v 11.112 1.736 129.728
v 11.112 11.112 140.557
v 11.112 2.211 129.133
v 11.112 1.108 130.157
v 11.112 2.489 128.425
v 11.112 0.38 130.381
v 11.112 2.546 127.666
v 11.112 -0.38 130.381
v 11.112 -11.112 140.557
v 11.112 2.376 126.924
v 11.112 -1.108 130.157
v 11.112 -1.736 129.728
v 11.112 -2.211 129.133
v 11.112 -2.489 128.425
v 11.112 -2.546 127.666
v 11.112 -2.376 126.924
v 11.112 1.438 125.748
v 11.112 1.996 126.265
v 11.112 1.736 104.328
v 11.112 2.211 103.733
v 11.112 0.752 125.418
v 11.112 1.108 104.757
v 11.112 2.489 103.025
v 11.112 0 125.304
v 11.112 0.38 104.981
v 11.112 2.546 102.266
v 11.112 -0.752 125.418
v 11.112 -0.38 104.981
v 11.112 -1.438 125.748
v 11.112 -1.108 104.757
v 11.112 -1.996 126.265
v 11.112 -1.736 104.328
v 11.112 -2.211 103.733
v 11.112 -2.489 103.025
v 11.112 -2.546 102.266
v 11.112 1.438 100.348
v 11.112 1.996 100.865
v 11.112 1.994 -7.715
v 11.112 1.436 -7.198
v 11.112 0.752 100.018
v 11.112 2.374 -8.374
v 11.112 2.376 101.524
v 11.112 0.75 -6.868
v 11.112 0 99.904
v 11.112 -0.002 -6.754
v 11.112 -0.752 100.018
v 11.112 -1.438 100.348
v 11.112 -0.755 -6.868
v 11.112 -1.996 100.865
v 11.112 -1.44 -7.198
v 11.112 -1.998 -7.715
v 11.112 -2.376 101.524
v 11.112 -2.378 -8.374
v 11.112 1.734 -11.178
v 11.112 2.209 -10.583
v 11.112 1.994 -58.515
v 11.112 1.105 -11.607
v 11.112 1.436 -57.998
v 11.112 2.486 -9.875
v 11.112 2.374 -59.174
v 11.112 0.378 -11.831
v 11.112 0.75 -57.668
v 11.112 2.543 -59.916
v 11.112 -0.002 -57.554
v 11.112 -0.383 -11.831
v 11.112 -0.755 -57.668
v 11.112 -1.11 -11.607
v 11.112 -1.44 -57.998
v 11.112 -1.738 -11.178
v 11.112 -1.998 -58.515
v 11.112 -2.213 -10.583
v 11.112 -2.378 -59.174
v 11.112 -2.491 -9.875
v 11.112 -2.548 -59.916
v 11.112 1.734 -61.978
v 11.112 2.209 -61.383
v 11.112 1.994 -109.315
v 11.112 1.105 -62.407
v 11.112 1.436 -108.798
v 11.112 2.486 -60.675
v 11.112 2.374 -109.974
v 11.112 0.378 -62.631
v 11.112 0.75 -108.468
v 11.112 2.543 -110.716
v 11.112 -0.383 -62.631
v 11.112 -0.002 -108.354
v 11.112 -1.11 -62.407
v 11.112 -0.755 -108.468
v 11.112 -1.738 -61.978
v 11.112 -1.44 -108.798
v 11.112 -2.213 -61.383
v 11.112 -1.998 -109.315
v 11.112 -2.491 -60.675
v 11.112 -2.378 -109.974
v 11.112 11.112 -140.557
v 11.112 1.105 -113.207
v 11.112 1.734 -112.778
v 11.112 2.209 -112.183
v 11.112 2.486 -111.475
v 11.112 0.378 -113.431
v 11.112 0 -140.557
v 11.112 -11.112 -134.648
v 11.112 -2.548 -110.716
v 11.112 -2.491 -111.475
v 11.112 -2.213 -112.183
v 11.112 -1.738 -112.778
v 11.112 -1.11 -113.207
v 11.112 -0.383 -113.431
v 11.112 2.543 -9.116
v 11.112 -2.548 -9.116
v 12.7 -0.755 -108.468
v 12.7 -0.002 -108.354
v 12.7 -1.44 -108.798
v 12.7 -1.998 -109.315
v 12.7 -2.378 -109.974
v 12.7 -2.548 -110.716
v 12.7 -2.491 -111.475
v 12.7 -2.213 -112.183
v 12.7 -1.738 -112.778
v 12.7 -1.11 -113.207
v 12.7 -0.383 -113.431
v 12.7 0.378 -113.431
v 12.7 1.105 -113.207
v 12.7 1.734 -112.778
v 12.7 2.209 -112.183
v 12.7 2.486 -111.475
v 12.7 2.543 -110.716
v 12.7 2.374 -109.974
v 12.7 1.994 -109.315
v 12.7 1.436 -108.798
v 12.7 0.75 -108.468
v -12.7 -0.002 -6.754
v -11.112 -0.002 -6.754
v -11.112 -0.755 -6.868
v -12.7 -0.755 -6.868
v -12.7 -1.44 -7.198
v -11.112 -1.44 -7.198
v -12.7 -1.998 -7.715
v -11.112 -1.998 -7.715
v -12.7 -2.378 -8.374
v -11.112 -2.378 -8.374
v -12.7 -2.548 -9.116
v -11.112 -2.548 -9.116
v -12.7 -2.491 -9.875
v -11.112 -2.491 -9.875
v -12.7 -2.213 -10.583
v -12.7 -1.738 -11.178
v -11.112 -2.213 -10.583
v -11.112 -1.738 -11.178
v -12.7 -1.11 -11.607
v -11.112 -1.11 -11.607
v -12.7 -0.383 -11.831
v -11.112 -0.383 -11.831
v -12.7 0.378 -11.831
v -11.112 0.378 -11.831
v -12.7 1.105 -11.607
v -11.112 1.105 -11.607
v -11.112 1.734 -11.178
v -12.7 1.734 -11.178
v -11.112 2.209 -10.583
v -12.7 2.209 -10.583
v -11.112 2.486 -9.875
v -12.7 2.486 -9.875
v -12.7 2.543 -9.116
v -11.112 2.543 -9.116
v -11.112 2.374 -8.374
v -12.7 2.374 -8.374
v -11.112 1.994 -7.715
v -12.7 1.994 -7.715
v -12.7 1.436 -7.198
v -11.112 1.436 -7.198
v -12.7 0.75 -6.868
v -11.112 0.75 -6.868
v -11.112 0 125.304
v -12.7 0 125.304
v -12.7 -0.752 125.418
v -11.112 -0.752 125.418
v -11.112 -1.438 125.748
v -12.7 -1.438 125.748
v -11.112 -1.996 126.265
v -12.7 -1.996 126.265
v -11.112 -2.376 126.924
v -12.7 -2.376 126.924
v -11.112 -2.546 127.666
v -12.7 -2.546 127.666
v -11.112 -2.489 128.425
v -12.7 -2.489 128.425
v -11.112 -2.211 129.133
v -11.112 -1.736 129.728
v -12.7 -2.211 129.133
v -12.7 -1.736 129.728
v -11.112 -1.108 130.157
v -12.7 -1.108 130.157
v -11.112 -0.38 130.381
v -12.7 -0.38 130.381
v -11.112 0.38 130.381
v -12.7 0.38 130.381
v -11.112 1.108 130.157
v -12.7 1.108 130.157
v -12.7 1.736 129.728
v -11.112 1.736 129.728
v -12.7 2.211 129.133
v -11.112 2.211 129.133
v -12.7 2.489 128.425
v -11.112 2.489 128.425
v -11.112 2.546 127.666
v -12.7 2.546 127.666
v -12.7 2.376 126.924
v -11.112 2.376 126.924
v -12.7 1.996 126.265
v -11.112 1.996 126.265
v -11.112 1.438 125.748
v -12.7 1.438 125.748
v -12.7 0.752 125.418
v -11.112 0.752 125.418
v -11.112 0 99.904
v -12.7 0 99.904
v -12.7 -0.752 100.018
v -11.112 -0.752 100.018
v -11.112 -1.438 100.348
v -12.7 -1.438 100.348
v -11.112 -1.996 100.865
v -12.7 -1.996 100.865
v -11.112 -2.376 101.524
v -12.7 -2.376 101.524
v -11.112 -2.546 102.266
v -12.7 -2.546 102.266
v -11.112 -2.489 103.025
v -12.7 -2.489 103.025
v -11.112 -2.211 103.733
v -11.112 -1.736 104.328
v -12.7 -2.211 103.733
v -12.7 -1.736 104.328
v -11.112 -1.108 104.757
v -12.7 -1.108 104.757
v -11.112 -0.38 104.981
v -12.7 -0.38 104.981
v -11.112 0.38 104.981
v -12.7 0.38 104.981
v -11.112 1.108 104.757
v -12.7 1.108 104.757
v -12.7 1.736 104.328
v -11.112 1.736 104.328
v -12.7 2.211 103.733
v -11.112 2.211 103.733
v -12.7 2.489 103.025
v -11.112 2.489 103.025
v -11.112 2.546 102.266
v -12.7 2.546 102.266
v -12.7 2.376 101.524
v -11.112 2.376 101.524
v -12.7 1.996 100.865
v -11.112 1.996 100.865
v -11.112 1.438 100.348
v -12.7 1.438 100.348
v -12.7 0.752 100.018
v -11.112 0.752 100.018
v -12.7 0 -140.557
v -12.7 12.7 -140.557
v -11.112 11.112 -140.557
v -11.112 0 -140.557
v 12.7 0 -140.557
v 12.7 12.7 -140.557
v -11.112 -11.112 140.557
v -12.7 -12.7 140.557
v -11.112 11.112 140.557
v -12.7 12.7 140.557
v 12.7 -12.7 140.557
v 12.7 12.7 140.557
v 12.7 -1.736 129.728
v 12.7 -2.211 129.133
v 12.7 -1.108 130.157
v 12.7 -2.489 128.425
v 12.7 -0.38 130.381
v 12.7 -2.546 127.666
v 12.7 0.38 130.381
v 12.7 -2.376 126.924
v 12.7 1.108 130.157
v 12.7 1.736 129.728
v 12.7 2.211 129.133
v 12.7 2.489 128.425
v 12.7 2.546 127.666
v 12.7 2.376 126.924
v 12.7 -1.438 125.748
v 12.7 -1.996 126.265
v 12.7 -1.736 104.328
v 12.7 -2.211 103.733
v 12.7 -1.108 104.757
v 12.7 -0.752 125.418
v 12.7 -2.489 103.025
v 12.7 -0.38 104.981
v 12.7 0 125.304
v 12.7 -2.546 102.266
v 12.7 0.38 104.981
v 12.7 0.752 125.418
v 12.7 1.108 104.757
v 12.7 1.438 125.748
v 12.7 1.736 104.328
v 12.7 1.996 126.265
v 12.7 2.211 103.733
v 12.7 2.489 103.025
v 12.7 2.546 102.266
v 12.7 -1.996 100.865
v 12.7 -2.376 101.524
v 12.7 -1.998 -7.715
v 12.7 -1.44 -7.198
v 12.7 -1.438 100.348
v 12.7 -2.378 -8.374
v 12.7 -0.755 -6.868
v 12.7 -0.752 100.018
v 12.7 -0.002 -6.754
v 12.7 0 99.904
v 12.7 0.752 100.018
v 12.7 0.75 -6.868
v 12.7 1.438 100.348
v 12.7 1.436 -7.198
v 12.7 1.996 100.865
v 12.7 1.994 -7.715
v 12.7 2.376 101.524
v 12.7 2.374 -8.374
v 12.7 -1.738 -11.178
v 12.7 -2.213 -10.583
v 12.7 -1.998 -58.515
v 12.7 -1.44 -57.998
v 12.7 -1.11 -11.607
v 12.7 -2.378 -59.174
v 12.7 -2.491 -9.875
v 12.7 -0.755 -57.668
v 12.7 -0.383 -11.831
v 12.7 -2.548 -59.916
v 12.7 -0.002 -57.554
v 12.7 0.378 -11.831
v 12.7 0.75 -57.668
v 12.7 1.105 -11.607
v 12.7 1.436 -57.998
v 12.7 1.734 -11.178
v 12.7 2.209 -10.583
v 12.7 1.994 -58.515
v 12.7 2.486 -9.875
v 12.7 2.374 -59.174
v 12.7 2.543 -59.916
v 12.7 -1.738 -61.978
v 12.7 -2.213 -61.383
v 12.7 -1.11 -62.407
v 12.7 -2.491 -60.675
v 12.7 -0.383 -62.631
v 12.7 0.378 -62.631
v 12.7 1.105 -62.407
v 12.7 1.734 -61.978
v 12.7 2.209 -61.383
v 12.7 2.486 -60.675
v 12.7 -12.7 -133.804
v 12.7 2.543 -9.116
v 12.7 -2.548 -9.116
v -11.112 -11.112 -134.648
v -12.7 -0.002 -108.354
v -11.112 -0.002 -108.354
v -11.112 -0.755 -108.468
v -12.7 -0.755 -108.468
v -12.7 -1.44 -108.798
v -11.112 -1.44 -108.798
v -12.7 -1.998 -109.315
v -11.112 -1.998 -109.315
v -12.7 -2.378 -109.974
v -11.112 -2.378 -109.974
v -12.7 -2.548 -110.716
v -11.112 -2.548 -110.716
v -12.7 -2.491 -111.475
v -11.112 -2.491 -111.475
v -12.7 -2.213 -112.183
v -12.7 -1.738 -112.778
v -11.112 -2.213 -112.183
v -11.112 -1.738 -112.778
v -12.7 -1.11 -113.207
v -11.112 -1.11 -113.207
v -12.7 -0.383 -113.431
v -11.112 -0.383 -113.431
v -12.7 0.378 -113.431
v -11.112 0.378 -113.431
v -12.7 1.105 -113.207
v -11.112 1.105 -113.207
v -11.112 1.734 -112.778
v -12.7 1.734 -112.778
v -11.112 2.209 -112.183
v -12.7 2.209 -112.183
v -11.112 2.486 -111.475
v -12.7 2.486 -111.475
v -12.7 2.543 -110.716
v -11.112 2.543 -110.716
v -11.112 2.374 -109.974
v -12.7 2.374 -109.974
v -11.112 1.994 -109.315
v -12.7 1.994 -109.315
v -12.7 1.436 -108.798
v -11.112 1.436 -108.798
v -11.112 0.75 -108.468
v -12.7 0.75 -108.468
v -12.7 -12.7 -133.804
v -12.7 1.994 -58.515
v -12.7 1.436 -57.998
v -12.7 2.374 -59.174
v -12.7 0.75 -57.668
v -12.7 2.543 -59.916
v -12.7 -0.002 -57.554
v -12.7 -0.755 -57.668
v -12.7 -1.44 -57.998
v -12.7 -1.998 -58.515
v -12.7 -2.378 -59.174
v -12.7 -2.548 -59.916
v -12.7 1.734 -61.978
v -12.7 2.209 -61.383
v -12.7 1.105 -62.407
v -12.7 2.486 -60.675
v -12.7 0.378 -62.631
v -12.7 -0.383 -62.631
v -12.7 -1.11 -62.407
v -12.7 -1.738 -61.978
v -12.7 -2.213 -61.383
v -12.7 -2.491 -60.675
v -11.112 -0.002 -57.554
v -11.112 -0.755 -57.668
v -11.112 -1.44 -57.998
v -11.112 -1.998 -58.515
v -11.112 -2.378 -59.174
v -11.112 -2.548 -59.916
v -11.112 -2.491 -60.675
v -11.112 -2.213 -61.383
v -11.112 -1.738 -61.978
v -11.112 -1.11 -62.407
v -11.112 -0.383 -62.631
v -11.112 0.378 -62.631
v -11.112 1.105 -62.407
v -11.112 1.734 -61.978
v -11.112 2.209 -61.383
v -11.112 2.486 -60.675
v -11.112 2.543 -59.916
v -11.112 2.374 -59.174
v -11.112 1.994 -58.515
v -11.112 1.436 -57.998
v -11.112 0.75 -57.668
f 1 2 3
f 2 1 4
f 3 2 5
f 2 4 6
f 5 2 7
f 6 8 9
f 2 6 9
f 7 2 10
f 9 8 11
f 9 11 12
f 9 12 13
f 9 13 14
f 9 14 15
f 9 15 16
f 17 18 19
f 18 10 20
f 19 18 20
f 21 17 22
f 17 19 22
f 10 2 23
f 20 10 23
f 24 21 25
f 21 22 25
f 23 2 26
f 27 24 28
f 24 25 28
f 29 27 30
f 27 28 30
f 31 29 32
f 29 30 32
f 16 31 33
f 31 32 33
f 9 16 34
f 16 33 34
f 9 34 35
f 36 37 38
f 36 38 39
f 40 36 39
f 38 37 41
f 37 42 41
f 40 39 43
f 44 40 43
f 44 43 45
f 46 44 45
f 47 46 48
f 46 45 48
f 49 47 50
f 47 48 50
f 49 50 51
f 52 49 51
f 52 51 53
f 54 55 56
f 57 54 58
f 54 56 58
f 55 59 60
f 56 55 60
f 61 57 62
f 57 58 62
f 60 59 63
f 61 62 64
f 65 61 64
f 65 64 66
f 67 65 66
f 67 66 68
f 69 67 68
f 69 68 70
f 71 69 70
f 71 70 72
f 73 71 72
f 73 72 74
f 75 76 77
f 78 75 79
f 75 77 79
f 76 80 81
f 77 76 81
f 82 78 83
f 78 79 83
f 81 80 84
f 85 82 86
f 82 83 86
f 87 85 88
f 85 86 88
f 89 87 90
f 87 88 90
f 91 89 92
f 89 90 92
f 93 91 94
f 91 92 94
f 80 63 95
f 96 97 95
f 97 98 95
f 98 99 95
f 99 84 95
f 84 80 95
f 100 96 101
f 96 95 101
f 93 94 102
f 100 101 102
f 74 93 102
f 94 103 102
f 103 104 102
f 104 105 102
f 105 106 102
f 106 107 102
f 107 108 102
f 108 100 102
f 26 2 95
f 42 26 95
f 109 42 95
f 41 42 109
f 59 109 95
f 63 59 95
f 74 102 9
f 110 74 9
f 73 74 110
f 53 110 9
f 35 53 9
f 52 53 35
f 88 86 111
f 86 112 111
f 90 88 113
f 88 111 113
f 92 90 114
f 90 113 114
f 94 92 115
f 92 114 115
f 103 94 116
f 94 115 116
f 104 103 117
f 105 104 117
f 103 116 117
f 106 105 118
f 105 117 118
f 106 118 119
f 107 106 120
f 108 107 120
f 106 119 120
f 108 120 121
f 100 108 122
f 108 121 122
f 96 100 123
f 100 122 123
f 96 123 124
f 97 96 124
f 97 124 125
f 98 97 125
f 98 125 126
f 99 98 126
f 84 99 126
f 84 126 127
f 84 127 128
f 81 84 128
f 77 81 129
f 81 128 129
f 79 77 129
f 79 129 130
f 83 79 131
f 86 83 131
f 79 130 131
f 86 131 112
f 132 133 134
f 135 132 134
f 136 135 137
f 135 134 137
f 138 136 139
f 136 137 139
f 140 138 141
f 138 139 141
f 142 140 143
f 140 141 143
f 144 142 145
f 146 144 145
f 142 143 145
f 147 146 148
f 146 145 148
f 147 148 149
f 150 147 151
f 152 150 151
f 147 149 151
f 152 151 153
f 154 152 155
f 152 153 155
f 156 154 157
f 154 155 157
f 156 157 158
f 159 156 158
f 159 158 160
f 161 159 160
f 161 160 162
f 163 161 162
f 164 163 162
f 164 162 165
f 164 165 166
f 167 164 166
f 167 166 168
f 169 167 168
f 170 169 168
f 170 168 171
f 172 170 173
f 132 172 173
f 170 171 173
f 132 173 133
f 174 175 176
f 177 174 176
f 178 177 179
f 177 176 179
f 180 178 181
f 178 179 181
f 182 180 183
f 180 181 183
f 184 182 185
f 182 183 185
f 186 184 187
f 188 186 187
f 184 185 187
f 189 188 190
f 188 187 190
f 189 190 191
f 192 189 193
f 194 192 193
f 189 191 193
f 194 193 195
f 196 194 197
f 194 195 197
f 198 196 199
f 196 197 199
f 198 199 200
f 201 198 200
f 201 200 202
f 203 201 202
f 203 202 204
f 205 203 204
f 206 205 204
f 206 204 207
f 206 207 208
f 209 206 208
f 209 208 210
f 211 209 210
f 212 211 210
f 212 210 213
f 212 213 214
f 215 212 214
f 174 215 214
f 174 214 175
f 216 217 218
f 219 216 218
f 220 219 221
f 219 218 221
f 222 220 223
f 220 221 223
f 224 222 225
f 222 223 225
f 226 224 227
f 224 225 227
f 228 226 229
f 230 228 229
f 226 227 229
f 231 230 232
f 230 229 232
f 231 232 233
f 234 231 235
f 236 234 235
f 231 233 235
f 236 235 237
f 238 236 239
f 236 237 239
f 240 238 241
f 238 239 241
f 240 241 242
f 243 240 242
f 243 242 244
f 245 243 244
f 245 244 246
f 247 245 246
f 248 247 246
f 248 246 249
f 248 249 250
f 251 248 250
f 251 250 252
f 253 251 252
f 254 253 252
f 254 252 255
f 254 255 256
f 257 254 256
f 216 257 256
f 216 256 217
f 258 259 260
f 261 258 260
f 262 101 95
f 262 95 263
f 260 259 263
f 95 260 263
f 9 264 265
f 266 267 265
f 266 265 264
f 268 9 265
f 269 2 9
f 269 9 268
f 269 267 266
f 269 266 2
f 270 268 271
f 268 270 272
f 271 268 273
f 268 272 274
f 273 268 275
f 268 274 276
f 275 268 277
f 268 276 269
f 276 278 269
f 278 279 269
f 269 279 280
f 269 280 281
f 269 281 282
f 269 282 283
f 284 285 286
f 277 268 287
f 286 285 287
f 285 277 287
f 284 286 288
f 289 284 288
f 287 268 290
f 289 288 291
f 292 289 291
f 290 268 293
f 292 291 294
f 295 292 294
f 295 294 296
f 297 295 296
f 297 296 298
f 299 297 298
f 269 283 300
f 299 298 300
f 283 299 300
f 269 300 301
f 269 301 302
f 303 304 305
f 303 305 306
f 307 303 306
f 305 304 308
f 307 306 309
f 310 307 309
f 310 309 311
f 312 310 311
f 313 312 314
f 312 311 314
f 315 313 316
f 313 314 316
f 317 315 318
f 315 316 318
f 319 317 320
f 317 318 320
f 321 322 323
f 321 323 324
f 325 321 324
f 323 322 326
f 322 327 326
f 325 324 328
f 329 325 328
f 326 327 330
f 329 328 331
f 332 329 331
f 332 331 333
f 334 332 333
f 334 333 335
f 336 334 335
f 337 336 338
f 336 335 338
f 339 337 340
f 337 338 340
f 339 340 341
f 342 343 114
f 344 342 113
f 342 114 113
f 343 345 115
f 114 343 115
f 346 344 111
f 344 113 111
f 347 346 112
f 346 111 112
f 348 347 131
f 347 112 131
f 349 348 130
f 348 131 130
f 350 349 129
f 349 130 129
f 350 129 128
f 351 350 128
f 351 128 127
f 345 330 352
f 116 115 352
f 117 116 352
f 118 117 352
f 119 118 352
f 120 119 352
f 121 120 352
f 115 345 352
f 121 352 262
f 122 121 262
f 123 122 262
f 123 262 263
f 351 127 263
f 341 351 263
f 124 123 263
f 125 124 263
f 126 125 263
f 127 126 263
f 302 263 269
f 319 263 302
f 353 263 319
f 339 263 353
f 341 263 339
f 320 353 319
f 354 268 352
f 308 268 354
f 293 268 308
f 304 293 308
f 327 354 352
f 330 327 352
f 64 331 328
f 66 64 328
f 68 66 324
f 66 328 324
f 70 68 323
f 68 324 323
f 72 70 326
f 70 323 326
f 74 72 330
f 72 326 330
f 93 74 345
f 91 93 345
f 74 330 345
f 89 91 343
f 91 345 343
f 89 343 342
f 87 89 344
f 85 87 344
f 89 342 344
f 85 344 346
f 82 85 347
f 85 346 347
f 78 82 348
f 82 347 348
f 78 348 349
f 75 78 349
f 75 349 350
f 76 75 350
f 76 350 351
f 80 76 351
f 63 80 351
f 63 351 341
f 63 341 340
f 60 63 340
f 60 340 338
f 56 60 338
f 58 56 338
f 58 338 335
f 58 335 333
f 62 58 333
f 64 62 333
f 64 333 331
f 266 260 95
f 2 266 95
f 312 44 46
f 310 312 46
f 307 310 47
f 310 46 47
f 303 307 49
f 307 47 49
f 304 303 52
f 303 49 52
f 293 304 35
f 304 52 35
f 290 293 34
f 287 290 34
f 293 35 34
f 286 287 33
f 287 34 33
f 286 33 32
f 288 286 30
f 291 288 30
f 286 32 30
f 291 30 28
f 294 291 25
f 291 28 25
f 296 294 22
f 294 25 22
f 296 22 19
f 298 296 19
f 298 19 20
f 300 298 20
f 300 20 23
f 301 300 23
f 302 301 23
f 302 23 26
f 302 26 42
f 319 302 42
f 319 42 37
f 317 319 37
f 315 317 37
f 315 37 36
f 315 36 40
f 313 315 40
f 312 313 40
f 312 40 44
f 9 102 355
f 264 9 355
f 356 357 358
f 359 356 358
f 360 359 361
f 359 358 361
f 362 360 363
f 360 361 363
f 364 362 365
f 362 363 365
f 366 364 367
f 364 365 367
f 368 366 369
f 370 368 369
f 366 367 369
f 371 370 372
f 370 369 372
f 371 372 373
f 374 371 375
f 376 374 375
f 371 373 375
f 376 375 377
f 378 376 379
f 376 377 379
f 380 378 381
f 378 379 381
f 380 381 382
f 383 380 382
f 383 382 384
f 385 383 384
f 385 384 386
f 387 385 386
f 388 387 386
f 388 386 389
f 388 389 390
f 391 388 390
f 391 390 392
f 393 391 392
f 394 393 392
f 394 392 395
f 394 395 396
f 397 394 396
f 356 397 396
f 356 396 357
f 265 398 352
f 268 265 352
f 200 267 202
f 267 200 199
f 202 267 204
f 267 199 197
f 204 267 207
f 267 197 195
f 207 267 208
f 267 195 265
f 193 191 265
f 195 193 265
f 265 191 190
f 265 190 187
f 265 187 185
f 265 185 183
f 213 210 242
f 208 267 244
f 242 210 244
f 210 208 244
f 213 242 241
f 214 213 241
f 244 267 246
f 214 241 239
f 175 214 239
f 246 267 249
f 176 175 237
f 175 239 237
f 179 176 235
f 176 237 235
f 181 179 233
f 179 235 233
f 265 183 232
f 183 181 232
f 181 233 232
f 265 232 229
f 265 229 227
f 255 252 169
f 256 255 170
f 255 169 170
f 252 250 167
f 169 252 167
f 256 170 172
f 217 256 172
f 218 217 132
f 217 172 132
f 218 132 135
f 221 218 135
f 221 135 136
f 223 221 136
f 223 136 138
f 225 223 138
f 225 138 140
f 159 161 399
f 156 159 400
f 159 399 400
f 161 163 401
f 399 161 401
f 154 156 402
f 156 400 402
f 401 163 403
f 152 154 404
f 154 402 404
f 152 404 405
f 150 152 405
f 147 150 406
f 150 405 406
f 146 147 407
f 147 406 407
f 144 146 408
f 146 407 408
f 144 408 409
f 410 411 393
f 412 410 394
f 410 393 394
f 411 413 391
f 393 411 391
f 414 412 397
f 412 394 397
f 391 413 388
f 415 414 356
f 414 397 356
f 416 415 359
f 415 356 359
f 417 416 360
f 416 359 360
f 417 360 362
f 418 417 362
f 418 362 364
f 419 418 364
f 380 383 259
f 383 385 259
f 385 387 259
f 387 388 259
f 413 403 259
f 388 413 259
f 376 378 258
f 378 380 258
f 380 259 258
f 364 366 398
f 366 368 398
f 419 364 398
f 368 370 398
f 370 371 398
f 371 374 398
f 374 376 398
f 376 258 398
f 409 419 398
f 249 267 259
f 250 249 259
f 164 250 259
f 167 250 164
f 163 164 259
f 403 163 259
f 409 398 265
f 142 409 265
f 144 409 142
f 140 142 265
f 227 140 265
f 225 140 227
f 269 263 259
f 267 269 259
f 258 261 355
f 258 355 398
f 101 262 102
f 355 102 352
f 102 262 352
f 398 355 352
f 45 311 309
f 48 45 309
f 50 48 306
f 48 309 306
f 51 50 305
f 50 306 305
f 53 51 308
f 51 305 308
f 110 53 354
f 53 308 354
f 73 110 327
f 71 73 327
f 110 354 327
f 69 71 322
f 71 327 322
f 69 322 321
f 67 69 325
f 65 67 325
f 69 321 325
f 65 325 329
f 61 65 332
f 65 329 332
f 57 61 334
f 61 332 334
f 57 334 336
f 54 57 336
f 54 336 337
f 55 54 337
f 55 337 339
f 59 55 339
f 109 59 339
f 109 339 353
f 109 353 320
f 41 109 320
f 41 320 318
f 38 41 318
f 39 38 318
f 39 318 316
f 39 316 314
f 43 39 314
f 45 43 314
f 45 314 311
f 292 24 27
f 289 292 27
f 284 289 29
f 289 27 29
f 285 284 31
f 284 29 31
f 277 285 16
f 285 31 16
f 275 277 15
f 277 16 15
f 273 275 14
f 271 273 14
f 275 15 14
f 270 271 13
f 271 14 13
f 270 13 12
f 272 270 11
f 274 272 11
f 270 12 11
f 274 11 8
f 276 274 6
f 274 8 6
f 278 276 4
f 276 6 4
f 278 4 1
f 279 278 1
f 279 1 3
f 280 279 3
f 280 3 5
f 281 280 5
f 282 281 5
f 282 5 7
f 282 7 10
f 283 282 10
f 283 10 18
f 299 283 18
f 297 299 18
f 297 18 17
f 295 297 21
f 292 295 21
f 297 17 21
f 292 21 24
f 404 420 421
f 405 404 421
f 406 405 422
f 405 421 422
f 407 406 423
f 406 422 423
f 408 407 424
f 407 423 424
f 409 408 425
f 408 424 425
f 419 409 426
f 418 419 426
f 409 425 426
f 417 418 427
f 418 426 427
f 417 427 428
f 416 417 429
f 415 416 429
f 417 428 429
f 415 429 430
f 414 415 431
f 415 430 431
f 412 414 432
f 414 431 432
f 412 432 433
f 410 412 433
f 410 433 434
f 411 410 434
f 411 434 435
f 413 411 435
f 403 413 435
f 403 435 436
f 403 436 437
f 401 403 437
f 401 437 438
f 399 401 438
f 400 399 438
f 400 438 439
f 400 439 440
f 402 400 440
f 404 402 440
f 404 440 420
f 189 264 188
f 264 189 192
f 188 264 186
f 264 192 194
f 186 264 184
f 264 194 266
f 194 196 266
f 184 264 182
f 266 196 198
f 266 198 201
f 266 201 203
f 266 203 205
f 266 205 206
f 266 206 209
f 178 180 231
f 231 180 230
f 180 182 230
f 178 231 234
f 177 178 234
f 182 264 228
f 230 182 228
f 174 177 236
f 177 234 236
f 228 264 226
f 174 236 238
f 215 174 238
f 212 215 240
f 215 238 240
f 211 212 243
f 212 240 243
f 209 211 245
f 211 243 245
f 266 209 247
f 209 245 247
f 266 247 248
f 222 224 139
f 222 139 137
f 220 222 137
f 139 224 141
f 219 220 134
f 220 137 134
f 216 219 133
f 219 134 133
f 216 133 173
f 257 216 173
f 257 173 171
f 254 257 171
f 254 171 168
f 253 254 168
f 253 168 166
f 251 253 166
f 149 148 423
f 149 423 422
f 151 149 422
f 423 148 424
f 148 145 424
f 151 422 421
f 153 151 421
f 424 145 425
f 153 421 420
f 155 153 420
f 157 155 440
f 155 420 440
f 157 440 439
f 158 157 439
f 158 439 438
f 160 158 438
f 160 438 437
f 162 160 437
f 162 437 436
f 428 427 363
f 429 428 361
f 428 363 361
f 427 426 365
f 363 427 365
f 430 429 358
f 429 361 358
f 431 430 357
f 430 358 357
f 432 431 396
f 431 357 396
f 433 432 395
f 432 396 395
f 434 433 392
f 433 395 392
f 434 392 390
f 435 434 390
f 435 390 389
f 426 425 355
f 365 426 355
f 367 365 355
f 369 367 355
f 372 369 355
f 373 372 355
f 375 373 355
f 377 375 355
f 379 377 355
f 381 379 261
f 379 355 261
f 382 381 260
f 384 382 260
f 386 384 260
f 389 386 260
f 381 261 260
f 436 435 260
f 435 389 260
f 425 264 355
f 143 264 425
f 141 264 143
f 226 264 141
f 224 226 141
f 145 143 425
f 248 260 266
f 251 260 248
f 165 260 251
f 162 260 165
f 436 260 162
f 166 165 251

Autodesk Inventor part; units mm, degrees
ref_plane "YZ Plane" through (0, 0, 0) normal (1, 0, 0) x (0, 1, 0)
ref_plane "XZ Plane" through (0, 0, 0) normal (0, 1, 0) x (-1, 0, 0)
ref_plane "XY Plane" through (0, 0, 0) normal (0, 0, 1) x (1, 0, 0)
sketch "Sketch1" plane through (0, 0, 0) normal (0, 0, 1) x (1, 0, 0)
  line L0 (-12.7, -12.7) -> (12.7, -12.7)
  line L1 (12.7, -12.7) -> (12.7, 12.7)
  line L2 (12.7, 12.7) -> (-12.7, 12.7)
  line L3 (-12.7, 12.7) -> (-12.7, -12.7)
  line L4 (-12.7, -12.7) -> (12.7, 12.7) construction
  line L5 (12.7, -12.7) -> (-12.7, 12.7) construction
  line L6 (-11.1125, 11.1125) -> (11.1125, 11.1125)
  line L7 (11.1125, 11.1125) -> (11.1125, -11.1125)
  line L8 (11.1125, -11.1125) -> (-11.1125, -11.1125)
  line L9 (-11.1125, -11.1125) -> (-11.1125, 11.1125)
  point P0 (0, 0)
  dimension "width" = 25.4
  dimension "height" = 25.4
  dimension "thickness" = 1.5875
extrude "Extrusion1" add sketch "Sketch1" along normal mid plane 281.1138
sketch "Sketch2" plane through (12.7, -12.7, 140.5569) normal (1, 0, 0) x (0, 0, -1)
  line L0 (281.1138, 25.4) -> (281.1138, 0) construction
  line L1 (281.1138, 0) -> (0, 0) construction
  line L2 (0, 0) -> (0, 25.4) construction
  line L3 (0, 25.4) -> (281.1138, 25.4) construction
  point P0 (140.5569, 12.7)
  point P1 (12.7, 12.7)
  point P2 (38.1, 12.7)
  point P3 (0, 12.7)
  dimension "d5" = 25.4
  dimension "d6" = 12.7
hole "Hole1" at (12.7, 0, 127.8569) at (12.7, 0, 102.4569) direction (-1, 0, 0) diameter 5.1054 end through all clearance for "Flat Head Machine Screw (82)" size "#10" standard "Ansi Unified Screw Threads"
sketch "Sketch3" plane through (12.7, -12.7, 140.5569) normal (1, 0, 0) x (0, 0, -1)
  circle A0 centre (12.7, 12.7) radius 2.5527 construction
  circle A1 centre (38.1, 12.7) radius 2.5527 construction
  line L0 (281.1138, 25.4) -> (0, 25.4) construction
  line L1 (0, 0) -> (0, 25.4) construction
  line L2 (281.1138, 0) -> (0, 0) construction
  line L3 (281.1138, 25.4) -> (281.1138, 0) construction
  line L4 (281.1138, 25.4) -> (0, 25.4) construction
  line L5 (281.1138, 25.4) -> (281.1138, 0) construction
  line L6 (274.3611, 0) -> (281.1138, 0)
  line L7 (281.1138, 0) -> (281.1138, 12.7)
  line L8 (281.1138, 12.7) -> (274.3611, 0)
  point P0 (140.5569, 12.7)
  dimension "d14" = 28
extrude "Extrusion2" cut sketch "Sketch3" against normal through all
sketch "Sketch4" plane through (-12.7, -12.7, 140.5569) normal (-1, 0, 0) x (0, 0, 1)
  line L0 (-281.1138, 12.7) -> (-281.1138, 25.4) construction
  line L1 (-281.1138, 25.4) -> (0, 25.4) construction
  point P0 (-140.5569, 12.7)
  point P1 (-251.4637, 12.6978)
  point P2 (-200.6637, 12.6978)
  point P3 (-149.8637, 12.6978)
  point P4 (-281.1138, 19.05)
  dimension "d19" = 50.8
  dimension "d20" = 50.8
  dimension "d21" = 29.6501
  dimension "d22" = 12.7022
hole "Hole2" at (-12.7, -0.0022, -110.9068) at (-12.7, -0.0022, -60.1068) at (-12.7, -0.0022, -9.3068) direction (1, 0, 0) diameter 5.1054 end through all clearance for "Flat Head Machine Screw (82)" size "#10" standard "Ansi Unified Screw Threads"
equation "\"d20\" = d19"
properties part number "CL4-007" material "Aluminum 6061"
